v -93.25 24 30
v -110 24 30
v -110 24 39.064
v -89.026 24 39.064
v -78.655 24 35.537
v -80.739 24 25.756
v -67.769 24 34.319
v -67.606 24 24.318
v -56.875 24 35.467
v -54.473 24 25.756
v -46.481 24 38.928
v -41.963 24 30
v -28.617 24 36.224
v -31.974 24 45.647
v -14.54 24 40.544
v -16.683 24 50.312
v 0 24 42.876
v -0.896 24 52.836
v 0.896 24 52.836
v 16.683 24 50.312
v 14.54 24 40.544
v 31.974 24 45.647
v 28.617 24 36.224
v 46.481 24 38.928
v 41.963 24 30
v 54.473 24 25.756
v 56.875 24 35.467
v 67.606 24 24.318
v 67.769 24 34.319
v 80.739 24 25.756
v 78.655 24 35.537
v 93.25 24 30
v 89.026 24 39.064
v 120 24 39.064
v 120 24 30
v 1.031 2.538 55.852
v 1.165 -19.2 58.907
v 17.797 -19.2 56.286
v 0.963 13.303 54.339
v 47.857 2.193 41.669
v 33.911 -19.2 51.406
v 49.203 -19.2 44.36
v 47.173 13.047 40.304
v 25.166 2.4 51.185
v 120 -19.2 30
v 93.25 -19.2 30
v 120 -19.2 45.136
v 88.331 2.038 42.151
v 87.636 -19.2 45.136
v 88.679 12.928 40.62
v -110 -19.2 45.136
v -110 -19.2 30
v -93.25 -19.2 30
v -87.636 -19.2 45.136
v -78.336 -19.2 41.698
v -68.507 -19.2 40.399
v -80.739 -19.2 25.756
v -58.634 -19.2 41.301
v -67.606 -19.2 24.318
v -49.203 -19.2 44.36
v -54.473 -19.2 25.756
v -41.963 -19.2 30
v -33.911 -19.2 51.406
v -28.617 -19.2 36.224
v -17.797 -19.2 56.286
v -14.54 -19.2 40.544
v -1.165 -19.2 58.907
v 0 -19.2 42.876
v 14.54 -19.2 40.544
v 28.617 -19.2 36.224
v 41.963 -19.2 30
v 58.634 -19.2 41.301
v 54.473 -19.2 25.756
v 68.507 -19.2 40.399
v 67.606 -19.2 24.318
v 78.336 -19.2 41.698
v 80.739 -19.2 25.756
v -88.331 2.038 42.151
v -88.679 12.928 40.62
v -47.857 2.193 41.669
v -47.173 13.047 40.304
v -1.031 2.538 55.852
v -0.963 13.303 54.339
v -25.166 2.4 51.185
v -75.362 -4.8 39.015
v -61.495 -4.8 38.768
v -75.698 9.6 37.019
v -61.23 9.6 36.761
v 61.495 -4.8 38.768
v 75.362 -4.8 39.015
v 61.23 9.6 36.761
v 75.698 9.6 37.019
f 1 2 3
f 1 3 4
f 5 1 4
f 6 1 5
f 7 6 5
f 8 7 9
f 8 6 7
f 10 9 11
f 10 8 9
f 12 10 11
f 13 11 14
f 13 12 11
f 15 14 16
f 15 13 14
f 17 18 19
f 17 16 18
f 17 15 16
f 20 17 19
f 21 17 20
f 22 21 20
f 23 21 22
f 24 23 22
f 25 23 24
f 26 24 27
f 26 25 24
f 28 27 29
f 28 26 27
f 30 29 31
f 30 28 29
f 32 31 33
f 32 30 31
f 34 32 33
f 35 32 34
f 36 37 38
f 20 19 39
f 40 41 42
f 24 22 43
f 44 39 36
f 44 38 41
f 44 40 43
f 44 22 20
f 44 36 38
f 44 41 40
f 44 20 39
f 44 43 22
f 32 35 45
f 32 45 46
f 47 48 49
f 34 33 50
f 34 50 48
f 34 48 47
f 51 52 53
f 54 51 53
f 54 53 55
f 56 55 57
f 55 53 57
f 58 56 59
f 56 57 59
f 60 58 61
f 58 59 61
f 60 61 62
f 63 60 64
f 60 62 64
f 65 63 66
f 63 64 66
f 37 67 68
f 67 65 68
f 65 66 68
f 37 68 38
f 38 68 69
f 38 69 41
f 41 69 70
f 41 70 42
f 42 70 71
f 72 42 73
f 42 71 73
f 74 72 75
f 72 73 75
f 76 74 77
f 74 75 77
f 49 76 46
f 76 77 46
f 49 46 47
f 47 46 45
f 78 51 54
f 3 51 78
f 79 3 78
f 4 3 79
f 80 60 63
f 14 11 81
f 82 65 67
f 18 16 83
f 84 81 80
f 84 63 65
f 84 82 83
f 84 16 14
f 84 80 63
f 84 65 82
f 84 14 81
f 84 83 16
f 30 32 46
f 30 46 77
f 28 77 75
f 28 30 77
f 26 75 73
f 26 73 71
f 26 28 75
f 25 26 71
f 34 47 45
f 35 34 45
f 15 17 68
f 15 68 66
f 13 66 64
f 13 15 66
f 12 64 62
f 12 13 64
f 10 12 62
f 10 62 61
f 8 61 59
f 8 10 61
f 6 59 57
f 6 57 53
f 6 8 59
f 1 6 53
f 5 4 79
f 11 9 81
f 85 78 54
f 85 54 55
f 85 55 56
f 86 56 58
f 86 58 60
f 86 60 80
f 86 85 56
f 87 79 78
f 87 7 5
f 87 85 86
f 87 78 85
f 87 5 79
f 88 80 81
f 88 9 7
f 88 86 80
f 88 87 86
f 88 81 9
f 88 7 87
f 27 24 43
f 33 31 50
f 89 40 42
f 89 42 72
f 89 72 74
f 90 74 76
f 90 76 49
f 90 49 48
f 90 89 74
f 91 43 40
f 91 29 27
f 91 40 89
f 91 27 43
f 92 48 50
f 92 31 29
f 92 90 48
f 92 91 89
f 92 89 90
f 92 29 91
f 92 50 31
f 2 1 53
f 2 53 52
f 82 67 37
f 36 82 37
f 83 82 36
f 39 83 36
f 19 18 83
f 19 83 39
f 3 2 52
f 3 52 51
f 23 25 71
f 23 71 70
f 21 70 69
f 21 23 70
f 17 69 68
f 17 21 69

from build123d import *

# Parameters (mm, degrees)
BOSS_EXTRUDE1_DEPTH = 43.2
DRAFT2_ANGLE        = 8


with BuildPart() as part:
    # Sketch3 → Boss-Extrude1 (new body)
    with BuildSketch(Plane(origin=(0, 24, 0), x_dir=(1, 0, 0), z_dir=(0, 1, 0))):
        with BuildLine():
            Line((-0.896175087, -52.835898714), (0.896175087, -52.835898714))
            ThreePointArc((0.896175087, -52.835898714), (24.408925383, -48.242362776), (46.481310912, -38.927868909))
            ThreePointArc((46.481310912, -38.927868909), (67.768695813, -34.318589585), (89.02611517, -39.064148992))
            Line((89.02611517, -39.064148992), (120, -39.064148992))
            Line((120, -39.064148992), (120, -30))
            Line((120, -30), (93.25, -30))
            ThreePointArc((93.25, -30), (67.606257623, -24.318329423), (41.962515246, -30))
            ThreePointArc((41.962515246, -30), (21.653208784, -38.627914511), (0, -42.876136156))
            ThreePointArc((0, -42.876136156), (-21.653208784, -38.627914511), (-41.962515246, -30))
            ThreePointArc((-41.962515246, -30), (-67.606257623, -24.318329423), (-93.25, -30))
            Line((-93.25, -30), (-110, -30))
            Line((-110, -30), (-110, -39.064148992))
            Line((-110, -39.064148992), (-89.02611517, -39.064148992))
            ThreePointArc((-89.02611517, -39.064148992), (-67.768695813, -34.318589585), (-46.481310912, -38.927868909))
            ThreePointArc((-46.481310912, -38.927868909), (-24.408925383, -48.242362776), (-0.896175087, -52.835898714))
        make_face()
    extrude(amount=-BOSS_EXTRUDE1_DEPTH)

    # Draft2
    draft2_faces = [part.faces().sort_by_distance(p)[0] for p in [
        (0, 2.4, 52.835898714),
        (104.513057585, 2.4, 39.064148992),
        (67.768695813, 2.4, 34.318589585),
        (24.408925383, 2.4, 48.242362776),
        (-24.408925383, 2.4, 48.242362776),
        (-67.768695813, 2.4, 34.318589585),
        (-99.513057585, 2.4, 39.064148992),
    ]]
    draft(draft2_faces, Plane.ZX.offset(24), DRAFT2_ANGLE)


solid = part.part
